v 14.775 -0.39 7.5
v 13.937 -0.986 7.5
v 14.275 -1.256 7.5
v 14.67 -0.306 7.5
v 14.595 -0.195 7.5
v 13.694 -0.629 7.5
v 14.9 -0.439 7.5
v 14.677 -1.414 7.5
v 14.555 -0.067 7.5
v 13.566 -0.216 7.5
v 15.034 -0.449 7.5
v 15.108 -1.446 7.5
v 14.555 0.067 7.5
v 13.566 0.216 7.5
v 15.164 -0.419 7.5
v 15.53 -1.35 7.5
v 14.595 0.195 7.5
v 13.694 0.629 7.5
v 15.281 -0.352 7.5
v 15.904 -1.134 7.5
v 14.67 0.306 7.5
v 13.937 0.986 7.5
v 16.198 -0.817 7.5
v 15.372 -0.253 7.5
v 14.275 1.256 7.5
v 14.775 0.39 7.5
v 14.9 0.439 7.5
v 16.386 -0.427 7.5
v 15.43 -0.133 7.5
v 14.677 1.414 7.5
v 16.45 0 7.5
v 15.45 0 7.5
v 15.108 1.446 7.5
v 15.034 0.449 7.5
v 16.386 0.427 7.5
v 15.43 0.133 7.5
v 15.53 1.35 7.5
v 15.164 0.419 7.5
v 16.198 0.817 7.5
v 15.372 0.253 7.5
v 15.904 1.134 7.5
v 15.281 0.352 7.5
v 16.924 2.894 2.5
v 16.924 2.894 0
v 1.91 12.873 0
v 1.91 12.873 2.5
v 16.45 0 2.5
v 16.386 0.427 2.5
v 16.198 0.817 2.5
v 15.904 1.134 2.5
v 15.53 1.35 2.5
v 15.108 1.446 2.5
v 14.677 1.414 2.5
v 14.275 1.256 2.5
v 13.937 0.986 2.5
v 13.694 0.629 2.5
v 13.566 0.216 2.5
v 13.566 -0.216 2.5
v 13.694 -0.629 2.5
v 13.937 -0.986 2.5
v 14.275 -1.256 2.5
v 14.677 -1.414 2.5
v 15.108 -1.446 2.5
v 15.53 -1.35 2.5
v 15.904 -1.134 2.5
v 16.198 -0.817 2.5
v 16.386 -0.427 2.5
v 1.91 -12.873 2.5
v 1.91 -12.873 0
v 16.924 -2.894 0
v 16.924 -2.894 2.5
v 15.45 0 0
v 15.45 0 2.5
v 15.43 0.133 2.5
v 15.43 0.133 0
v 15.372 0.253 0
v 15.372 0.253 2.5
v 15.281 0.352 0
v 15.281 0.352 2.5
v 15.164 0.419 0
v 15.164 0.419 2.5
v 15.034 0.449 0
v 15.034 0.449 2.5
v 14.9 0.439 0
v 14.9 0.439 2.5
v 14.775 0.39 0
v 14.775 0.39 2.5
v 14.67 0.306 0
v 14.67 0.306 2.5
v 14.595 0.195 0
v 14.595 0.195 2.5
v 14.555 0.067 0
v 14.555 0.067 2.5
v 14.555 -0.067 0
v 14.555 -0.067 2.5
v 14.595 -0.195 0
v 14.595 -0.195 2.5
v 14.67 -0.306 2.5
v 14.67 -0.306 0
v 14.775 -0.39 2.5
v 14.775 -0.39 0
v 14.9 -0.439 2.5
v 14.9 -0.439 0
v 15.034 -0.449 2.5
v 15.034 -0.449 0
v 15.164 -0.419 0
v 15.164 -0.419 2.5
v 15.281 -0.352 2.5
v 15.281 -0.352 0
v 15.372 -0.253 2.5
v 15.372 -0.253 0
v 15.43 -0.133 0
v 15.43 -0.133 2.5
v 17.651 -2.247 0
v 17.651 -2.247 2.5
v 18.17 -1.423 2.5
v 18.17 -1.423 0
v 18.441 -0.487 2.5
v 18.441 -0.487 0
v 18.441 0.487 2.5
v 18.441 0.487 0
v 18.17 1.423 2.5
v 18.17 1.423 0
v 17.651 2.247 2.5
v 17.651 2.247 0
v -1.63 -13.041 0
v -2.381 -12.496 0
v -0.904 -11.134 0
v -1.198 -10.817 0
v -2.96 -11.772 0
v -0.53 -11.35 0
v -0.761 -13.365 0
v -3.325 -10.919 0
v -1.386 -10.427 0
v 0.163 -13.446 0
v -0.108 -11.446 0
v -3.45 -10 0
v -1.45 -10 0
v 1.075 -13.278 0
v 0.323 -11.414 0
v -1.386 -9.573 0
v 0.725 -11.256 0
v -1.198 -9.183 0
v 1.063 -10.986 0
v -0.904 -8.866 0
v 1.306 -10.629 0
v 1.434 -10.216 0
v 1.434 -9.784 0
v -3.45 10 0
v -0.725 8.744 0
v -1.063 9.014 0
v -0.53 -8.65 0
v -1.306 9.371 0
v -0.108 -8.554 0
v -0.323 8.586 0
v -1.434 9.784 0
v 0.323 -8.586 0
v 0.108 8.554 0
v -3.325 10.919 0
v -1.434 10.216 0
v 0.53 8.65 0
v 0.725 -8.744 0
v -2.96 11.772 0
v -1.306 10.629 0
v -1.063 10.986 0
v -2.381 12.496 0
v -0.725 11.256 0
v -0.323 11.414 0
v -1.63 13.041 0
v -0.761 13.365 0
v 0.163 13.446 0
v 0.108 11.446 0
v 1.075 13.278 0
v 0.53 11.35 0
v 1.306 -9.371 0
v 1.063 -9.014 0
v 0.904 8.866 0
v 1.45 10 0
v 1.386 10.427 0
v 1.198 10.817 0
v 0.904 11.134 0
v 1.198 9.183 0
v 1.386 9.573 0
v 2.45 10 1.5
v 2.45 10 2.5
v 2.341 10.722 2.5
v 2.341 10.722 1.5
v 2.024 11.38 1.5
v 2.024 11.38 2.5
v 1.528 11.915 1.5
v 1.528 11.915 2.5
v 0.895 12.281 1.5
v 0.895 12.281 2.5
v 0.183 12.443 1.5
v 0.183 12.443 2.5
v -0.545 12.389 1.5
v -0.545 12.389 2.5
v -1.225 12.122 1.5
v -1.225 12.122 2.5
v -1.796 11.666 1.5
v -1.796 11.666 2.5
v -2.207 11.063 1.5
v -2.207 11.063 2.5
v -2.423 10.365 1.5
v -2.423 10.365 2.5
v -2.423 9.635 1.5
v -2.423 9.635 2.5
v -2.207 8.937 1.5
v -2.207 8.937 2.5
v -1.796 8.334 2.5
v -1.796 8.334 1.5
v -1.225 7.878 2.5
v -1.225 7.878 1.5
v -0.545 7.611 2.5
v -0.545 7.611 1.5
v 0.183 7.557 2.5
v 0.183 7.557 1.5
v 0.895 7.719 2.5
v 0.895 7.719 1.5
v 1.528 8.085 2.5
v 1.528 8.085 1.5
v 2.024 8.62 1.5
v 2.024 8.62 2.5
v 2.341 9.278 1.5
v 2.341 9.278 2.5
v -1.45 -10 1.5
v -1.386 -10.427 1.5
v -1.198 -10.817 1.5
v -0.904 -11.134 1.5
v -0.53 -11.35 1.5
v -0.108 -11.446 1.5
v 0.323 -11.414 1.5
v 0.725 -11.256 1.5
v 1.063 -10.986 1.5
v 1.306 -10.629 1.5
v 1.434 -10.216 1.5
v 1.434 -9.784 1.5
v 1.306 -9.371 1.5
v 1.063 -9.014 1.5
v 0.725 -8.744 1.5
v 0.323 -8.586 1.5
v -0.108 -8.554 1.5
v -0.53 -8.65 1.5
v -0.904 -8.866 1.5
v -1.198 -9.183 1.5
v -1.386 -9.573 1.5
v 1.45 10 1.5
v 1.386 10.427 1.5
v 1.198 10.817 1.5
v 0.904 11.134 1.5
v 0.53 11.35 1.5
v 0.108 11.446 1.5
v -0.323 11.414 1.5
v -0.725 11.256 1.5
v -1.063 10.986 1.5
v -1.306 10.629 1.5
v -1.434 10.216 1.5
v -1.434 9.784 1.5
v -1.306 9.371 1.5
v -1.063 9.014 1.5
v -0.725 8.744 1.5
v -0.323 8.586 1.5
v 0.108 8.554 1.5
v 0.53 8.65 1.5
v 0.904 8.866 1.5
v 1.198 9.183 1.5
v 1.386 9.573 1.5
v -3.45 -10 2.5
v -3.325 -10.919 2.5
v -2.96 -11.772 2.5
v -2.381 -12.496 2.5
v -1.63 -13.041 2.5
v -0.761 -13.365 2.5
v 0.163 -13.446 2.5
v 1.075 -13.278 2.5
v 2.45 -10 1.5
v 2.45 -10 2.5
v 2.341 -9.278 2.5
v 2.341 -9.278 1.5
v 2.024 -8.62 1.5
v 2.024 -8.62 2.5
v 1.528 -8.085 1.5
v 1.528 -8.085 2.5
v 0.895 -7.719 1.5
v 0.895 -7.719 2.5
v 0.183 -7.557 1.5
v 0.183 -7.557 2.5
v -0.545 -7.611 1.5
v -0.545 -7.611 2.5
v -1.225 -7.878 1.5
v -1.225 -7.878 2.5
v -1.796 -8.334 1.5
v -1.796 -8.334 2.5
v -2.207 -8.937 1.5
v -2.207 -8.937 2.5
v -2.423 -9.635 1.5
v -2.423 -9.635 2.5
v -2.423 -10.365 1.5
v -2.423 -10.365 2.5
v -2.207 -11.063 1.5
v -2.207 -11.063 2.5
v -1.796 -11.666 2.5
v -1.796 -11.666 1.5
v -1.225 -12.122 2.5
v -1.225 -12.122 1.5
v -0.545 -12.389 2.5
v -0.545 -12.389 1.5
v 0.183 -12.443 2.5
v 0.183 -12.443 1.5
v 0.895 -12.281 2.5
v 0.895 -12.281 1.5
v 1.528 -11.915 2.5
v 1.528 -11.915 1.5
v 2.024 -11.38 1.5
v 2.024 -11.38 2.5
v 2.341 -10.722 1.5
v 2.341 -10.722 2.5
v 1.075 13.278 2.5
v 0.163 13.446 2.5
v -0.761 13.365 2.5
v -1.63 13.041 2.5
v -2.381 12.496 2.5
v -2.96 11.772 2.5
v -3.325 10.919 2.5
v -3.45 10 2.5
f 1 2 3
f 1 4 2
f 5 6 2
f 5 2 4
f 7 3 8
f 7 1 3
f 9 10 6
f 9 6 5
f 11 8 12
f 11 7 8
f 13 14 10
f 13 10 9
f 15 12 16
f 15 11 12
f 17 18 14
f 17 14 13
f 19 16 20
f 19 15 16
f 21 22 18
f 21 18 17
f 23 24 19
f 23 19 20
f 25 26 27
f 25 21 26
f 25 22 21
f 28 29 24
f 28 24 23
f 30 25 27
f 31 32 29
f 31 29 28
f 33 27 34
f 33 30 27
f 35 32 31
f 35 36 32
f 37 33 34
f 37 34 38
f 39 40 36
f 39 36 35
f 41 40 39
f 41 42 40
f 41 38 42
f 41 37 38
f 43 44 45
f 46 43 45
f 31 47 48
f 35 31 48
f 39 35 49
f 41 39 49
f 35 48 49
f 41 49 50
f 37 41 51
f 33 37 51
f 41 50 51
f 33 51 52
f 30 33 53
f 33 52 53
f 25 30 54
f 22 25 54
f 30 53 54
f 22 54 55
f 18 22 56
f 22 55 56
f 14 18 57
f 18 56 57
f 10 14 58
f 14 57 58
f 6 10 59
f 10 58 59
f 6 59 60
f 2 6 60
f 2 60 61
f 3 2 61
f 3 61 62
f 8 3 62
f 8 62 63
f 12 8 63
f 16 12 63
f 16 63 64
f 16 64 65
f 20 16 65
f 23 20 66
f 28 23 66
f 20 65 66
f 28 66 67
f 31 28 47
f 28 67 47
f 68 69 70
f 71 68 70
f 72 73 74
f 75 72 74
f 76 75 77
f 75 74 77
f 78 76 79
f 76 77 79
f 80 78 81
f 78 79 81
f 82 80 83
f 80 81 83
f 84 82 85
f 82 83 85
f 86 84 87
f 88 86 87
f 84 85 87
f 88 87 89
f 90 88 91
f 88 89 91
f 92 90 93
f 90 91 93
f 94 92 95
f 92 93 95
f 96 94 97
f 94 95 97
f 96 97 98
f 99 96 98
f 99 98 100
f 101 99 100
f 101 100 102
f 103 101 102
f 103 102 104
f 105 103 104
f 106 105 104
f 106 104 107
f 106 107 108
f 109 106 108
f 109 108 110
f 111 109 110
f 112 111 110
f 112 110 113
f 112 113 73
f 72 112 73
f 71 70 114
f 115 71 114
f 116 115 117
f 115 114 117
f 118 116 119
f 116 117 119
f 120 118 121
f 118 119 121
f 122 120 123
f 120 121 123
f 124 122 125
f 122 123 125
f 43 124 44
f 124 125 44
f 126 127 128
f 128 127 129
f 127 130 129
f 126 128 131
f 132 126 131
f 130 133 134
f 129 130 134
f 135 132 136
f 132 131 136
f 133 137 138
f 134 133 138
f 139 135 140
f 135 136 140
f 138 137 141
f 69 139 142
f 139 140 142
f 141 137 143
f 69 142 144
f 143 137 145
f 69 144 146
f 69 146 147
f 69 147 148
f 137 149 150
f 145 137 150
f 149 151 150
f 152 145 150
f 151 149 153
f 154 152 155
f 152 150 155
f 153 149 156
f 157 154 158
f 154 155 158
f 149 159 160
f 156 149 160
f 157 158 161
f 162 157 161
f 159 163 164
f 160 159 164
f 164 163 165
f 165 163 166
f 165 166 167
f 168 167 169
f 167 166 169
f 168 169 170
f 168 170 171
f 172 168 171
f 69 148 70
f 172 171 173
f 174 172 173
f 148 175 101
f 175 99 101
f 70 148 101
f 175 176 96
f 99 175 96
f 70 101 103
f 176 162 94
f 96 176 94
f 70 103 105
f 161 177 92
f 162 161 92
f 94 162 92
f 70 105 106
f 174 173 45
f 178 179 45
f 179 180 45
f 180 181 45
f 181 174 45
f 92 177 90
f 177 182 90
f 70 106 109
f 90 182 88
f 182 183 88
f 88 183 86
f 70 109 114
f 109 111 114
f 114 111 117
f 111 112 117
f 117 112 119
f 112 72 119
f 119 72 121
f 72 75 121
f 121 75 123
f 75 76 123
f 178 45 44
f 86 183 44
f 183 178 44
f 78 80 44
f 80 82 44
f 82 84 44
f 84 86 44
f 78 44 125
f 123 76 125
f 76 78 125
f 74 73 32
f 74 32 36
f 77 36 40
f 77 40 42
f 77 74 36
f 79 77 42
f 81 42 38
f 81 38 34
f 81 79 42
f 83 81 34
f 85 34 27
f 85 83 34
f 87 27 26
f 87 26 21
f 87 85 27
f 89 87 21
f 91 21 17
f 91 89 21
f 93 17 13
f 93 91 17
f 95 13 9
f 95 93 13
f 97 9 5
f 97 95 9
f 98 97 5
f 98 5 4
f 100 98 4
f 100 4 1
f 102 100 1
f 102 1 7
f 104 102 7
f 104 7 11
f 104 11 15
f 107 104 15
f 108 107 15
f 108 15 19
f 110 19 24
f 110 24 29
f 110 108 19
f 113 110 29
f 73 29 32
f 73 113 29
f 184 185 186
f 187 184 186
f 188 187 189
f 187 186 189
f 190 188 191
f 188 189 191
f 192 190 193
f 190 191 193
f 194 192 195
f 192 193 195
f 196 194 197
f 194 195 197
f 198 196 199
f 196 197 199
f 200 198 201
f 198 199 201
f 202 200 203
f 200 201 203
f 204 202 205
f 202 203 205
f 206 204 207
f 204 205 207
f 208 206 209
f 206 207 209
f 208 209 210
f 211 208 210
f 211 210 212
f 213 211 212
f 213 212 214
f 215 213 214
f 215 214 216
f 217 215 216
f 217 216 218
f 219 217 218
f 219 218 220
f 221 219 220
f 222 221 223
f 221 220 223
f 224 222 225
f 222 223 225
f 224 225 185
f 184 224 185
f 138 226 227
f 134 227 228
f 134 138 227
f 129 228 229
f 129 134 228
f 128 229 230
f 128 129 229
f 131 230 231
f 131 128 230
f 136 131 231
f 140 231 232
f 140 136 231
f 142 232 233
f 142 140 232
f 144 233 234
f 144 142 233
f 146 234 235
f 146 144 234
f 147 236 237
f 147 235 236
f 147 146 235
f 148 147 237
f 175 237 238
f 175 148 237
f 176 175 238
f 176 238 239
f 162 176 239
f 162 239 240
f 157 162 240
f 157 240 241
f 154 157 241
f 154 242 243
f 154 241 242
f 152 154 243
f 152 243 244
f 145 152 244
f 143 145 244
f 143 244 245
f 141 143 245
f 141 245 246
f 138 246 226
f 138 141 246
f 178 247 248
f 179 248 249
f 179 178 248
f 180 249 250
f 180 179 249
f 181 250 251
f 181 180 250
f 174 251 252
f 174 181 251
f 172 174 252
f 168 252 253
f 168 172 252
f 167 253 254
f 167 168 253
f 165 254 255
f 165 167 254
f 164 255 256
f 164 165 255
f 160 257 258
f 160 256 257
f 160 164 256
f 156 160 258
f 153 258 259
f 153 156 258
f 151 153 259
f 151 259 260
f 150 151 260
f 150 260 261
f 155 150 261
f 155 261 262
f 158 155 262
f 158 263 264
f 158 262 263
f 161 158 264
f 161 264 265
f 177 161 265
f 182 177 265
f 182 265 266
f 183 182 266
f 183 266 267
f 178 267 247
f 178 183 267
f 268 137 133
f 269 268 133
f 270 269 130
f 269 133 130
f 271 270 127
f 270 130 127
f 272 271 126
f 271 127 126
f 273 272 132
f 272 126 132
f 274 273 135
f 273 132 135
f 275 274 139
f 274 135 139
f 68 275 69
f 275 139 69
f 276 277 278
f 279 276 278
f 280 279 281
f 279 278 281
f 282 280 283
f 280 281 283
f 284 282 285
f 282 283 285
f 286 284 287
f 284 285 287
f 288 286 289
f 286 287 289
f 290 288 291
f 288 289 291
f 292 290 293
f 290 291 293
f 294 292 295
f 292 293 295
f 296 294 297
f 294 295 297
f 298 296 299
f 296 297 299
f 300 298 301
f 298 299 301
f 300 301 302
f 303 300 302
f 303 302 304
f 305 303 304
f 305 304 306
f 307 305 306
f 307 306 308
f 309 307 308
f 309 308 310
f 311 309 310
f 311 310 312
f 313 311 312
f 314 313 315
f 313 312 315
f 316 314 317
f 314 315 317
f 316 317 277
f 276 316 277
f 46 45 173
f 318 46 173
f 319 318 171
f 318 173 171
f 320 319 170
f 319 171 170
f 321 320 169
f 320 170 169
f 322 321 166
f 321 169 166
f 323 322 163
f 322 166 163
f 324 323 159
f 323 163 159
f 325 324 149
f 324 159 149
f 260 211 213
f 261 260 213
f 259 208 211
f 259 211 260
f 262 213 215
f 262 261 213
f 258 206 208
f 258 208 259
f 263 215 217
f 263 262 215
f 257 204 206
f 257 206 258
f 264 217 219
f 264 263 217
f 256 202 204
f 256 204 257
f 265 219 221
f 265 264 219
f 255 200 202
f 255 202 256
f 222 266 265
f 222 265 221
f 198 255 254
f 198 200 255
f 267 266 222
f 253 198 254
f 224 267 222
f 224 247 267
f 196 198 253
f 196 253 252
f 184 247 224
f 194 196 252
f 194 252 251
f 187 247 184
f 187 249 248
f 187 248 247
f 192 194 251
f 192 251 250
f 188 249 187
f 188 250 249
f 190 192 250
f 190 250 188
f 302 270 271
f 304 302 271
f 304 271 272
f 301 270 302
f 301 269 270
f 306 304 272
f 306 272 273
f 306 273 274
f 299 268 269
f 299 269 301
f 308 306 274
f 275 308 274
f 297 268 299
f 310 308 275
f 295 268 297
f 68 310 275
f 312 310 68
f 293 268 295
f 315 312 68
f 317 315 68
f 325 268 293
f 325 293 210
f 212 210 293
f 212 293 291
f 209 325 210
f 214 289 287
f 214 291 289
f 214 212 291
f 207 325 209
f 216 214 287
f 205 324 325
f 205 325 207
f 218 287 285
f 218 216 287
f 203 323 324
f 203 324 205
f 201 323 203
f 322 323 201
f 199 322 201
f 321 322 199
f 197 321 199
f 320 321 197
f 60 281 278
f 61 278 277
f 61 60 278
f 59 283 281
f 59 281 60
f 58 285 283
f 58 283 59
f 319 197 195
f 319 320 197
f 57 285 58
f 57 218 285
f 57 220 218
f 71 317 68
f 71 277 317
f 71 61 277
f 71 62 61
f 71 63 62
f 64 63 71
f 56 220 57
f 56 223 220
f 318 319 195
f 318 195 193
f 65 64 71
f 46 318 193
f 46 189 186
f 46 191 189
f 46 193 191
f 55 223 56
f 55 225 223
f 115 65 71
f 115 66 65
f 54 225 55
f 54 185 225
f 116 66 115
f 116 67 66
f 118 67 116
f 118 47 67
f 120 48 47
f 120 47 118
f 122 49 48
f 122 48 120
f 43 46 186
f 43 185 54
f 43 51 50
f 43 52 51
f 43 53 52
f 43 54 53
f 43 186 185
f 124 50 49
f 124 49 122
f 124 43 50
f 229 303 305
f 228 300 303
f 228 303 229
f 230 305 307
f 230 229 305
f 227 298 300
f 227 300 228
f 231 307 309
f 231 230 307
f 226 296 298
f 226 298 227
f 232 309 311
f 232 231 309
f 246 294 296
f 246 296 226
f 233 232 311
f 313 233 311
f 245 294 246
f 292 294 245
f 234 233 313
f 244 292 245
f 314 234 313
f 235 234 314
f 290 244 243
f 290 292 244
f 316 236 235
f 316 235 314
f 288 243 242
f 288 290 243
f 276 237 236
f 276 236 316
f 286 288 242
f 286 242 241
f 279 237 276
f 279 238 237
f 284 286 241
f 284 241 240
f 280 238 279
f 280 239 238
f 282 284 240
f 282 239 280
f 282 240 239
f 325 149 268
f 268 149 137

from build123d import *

# Parameters (mm, degrees)
CROQUIS1_R              = 1.45
SALIENTE_EXTRUIR1_DEPTH = 2.5
CROQUIS2_R              = 2.45
CORTAR_EXTRUIR1_DEPTH   = 1
CROQUIS3_R              = 1.45
CROQUIS3_R_2            = 0.45
SALIENTE_EXTRUIR2_DEPTH = 5
CROQUIS4_R              = 0.45
CORTAR_EXTRUIR2_DEPTH   = 24.392907579


with BuildPart() as part:
    # Croquis1 → Saliente-Extruir1 (new body)
    with BuildSketch(Plane.XY):
        with BuildLine():
            Line((-3.45, 10), (-3.45, -10))
            ThreePointArc((-3.45, -10), (-1.630018545, -13.040647882), (1.909733068, -12.873224601))
            Line((1.909733068, -12.873224601), (16.923571713, -2.89404507))
            ThreePointArc((16.923571713, -2.89404507), (18.475, 0), (16.923571713, 2.89404507))
            Line((16.923571713, 2.89404507), (1.909733068, 12.873224601))
            ThreePointArc((1.909733068, 12.873224601), (-1.630018545, 13.040647882), (-3.45, 10))
        make_face()
        with Locations((0, 10)):
            Circle(CROQUIS1_R, mode=Mode.SUBTRACT)
        with Locations(Location((0, -10, 0), (0, 0, 180))):
            Circle(CROQUIS1_R, mode=Mode.SUBTRACT)
    extrude(amount=SALIENTE_EXTRUIR1_DEPTH)

    # Croquis2 → Cortar-Extruir1 (cut)
    with BuildSketch(Plane.XY.offset(2.5)):
        with Locations((0, 10)):
            Circle(CROQUIS2_R)
        with Locations((0, -10)):
            Circle(CROQUIS2_R)
    extrude(amount=-CORTAR_EXTRUIR1_DEPTH, mode=Mode.SUBTRACT)

    # Croquis3 → Saliente-Extruir2 (add)
    with BuildSketch(Plane.XY.offset(2.5)):
        with Locations((15, 0)):
            Circle(CROQUIS3_R)
        with Locations((15, 0)):
            Circle(CROQUIS3_R_2, mode=Mode.SUBTRACT)
    extrude(amount=SALIENTE_EXTRUIR2_DEPTH)

    # Croquis4 → Cortar-Extruir2 (cut, through all)
    with BuildSketch(Plane.XY.offset(2.5)):
        with Locations((15, 0)):
            Circle(CROQUIS4_R)
    extrude(amount=-CORTAR_EXTRUIR2_DEPTH, mode=Mode.SUBTRACT)


solid = part.part
